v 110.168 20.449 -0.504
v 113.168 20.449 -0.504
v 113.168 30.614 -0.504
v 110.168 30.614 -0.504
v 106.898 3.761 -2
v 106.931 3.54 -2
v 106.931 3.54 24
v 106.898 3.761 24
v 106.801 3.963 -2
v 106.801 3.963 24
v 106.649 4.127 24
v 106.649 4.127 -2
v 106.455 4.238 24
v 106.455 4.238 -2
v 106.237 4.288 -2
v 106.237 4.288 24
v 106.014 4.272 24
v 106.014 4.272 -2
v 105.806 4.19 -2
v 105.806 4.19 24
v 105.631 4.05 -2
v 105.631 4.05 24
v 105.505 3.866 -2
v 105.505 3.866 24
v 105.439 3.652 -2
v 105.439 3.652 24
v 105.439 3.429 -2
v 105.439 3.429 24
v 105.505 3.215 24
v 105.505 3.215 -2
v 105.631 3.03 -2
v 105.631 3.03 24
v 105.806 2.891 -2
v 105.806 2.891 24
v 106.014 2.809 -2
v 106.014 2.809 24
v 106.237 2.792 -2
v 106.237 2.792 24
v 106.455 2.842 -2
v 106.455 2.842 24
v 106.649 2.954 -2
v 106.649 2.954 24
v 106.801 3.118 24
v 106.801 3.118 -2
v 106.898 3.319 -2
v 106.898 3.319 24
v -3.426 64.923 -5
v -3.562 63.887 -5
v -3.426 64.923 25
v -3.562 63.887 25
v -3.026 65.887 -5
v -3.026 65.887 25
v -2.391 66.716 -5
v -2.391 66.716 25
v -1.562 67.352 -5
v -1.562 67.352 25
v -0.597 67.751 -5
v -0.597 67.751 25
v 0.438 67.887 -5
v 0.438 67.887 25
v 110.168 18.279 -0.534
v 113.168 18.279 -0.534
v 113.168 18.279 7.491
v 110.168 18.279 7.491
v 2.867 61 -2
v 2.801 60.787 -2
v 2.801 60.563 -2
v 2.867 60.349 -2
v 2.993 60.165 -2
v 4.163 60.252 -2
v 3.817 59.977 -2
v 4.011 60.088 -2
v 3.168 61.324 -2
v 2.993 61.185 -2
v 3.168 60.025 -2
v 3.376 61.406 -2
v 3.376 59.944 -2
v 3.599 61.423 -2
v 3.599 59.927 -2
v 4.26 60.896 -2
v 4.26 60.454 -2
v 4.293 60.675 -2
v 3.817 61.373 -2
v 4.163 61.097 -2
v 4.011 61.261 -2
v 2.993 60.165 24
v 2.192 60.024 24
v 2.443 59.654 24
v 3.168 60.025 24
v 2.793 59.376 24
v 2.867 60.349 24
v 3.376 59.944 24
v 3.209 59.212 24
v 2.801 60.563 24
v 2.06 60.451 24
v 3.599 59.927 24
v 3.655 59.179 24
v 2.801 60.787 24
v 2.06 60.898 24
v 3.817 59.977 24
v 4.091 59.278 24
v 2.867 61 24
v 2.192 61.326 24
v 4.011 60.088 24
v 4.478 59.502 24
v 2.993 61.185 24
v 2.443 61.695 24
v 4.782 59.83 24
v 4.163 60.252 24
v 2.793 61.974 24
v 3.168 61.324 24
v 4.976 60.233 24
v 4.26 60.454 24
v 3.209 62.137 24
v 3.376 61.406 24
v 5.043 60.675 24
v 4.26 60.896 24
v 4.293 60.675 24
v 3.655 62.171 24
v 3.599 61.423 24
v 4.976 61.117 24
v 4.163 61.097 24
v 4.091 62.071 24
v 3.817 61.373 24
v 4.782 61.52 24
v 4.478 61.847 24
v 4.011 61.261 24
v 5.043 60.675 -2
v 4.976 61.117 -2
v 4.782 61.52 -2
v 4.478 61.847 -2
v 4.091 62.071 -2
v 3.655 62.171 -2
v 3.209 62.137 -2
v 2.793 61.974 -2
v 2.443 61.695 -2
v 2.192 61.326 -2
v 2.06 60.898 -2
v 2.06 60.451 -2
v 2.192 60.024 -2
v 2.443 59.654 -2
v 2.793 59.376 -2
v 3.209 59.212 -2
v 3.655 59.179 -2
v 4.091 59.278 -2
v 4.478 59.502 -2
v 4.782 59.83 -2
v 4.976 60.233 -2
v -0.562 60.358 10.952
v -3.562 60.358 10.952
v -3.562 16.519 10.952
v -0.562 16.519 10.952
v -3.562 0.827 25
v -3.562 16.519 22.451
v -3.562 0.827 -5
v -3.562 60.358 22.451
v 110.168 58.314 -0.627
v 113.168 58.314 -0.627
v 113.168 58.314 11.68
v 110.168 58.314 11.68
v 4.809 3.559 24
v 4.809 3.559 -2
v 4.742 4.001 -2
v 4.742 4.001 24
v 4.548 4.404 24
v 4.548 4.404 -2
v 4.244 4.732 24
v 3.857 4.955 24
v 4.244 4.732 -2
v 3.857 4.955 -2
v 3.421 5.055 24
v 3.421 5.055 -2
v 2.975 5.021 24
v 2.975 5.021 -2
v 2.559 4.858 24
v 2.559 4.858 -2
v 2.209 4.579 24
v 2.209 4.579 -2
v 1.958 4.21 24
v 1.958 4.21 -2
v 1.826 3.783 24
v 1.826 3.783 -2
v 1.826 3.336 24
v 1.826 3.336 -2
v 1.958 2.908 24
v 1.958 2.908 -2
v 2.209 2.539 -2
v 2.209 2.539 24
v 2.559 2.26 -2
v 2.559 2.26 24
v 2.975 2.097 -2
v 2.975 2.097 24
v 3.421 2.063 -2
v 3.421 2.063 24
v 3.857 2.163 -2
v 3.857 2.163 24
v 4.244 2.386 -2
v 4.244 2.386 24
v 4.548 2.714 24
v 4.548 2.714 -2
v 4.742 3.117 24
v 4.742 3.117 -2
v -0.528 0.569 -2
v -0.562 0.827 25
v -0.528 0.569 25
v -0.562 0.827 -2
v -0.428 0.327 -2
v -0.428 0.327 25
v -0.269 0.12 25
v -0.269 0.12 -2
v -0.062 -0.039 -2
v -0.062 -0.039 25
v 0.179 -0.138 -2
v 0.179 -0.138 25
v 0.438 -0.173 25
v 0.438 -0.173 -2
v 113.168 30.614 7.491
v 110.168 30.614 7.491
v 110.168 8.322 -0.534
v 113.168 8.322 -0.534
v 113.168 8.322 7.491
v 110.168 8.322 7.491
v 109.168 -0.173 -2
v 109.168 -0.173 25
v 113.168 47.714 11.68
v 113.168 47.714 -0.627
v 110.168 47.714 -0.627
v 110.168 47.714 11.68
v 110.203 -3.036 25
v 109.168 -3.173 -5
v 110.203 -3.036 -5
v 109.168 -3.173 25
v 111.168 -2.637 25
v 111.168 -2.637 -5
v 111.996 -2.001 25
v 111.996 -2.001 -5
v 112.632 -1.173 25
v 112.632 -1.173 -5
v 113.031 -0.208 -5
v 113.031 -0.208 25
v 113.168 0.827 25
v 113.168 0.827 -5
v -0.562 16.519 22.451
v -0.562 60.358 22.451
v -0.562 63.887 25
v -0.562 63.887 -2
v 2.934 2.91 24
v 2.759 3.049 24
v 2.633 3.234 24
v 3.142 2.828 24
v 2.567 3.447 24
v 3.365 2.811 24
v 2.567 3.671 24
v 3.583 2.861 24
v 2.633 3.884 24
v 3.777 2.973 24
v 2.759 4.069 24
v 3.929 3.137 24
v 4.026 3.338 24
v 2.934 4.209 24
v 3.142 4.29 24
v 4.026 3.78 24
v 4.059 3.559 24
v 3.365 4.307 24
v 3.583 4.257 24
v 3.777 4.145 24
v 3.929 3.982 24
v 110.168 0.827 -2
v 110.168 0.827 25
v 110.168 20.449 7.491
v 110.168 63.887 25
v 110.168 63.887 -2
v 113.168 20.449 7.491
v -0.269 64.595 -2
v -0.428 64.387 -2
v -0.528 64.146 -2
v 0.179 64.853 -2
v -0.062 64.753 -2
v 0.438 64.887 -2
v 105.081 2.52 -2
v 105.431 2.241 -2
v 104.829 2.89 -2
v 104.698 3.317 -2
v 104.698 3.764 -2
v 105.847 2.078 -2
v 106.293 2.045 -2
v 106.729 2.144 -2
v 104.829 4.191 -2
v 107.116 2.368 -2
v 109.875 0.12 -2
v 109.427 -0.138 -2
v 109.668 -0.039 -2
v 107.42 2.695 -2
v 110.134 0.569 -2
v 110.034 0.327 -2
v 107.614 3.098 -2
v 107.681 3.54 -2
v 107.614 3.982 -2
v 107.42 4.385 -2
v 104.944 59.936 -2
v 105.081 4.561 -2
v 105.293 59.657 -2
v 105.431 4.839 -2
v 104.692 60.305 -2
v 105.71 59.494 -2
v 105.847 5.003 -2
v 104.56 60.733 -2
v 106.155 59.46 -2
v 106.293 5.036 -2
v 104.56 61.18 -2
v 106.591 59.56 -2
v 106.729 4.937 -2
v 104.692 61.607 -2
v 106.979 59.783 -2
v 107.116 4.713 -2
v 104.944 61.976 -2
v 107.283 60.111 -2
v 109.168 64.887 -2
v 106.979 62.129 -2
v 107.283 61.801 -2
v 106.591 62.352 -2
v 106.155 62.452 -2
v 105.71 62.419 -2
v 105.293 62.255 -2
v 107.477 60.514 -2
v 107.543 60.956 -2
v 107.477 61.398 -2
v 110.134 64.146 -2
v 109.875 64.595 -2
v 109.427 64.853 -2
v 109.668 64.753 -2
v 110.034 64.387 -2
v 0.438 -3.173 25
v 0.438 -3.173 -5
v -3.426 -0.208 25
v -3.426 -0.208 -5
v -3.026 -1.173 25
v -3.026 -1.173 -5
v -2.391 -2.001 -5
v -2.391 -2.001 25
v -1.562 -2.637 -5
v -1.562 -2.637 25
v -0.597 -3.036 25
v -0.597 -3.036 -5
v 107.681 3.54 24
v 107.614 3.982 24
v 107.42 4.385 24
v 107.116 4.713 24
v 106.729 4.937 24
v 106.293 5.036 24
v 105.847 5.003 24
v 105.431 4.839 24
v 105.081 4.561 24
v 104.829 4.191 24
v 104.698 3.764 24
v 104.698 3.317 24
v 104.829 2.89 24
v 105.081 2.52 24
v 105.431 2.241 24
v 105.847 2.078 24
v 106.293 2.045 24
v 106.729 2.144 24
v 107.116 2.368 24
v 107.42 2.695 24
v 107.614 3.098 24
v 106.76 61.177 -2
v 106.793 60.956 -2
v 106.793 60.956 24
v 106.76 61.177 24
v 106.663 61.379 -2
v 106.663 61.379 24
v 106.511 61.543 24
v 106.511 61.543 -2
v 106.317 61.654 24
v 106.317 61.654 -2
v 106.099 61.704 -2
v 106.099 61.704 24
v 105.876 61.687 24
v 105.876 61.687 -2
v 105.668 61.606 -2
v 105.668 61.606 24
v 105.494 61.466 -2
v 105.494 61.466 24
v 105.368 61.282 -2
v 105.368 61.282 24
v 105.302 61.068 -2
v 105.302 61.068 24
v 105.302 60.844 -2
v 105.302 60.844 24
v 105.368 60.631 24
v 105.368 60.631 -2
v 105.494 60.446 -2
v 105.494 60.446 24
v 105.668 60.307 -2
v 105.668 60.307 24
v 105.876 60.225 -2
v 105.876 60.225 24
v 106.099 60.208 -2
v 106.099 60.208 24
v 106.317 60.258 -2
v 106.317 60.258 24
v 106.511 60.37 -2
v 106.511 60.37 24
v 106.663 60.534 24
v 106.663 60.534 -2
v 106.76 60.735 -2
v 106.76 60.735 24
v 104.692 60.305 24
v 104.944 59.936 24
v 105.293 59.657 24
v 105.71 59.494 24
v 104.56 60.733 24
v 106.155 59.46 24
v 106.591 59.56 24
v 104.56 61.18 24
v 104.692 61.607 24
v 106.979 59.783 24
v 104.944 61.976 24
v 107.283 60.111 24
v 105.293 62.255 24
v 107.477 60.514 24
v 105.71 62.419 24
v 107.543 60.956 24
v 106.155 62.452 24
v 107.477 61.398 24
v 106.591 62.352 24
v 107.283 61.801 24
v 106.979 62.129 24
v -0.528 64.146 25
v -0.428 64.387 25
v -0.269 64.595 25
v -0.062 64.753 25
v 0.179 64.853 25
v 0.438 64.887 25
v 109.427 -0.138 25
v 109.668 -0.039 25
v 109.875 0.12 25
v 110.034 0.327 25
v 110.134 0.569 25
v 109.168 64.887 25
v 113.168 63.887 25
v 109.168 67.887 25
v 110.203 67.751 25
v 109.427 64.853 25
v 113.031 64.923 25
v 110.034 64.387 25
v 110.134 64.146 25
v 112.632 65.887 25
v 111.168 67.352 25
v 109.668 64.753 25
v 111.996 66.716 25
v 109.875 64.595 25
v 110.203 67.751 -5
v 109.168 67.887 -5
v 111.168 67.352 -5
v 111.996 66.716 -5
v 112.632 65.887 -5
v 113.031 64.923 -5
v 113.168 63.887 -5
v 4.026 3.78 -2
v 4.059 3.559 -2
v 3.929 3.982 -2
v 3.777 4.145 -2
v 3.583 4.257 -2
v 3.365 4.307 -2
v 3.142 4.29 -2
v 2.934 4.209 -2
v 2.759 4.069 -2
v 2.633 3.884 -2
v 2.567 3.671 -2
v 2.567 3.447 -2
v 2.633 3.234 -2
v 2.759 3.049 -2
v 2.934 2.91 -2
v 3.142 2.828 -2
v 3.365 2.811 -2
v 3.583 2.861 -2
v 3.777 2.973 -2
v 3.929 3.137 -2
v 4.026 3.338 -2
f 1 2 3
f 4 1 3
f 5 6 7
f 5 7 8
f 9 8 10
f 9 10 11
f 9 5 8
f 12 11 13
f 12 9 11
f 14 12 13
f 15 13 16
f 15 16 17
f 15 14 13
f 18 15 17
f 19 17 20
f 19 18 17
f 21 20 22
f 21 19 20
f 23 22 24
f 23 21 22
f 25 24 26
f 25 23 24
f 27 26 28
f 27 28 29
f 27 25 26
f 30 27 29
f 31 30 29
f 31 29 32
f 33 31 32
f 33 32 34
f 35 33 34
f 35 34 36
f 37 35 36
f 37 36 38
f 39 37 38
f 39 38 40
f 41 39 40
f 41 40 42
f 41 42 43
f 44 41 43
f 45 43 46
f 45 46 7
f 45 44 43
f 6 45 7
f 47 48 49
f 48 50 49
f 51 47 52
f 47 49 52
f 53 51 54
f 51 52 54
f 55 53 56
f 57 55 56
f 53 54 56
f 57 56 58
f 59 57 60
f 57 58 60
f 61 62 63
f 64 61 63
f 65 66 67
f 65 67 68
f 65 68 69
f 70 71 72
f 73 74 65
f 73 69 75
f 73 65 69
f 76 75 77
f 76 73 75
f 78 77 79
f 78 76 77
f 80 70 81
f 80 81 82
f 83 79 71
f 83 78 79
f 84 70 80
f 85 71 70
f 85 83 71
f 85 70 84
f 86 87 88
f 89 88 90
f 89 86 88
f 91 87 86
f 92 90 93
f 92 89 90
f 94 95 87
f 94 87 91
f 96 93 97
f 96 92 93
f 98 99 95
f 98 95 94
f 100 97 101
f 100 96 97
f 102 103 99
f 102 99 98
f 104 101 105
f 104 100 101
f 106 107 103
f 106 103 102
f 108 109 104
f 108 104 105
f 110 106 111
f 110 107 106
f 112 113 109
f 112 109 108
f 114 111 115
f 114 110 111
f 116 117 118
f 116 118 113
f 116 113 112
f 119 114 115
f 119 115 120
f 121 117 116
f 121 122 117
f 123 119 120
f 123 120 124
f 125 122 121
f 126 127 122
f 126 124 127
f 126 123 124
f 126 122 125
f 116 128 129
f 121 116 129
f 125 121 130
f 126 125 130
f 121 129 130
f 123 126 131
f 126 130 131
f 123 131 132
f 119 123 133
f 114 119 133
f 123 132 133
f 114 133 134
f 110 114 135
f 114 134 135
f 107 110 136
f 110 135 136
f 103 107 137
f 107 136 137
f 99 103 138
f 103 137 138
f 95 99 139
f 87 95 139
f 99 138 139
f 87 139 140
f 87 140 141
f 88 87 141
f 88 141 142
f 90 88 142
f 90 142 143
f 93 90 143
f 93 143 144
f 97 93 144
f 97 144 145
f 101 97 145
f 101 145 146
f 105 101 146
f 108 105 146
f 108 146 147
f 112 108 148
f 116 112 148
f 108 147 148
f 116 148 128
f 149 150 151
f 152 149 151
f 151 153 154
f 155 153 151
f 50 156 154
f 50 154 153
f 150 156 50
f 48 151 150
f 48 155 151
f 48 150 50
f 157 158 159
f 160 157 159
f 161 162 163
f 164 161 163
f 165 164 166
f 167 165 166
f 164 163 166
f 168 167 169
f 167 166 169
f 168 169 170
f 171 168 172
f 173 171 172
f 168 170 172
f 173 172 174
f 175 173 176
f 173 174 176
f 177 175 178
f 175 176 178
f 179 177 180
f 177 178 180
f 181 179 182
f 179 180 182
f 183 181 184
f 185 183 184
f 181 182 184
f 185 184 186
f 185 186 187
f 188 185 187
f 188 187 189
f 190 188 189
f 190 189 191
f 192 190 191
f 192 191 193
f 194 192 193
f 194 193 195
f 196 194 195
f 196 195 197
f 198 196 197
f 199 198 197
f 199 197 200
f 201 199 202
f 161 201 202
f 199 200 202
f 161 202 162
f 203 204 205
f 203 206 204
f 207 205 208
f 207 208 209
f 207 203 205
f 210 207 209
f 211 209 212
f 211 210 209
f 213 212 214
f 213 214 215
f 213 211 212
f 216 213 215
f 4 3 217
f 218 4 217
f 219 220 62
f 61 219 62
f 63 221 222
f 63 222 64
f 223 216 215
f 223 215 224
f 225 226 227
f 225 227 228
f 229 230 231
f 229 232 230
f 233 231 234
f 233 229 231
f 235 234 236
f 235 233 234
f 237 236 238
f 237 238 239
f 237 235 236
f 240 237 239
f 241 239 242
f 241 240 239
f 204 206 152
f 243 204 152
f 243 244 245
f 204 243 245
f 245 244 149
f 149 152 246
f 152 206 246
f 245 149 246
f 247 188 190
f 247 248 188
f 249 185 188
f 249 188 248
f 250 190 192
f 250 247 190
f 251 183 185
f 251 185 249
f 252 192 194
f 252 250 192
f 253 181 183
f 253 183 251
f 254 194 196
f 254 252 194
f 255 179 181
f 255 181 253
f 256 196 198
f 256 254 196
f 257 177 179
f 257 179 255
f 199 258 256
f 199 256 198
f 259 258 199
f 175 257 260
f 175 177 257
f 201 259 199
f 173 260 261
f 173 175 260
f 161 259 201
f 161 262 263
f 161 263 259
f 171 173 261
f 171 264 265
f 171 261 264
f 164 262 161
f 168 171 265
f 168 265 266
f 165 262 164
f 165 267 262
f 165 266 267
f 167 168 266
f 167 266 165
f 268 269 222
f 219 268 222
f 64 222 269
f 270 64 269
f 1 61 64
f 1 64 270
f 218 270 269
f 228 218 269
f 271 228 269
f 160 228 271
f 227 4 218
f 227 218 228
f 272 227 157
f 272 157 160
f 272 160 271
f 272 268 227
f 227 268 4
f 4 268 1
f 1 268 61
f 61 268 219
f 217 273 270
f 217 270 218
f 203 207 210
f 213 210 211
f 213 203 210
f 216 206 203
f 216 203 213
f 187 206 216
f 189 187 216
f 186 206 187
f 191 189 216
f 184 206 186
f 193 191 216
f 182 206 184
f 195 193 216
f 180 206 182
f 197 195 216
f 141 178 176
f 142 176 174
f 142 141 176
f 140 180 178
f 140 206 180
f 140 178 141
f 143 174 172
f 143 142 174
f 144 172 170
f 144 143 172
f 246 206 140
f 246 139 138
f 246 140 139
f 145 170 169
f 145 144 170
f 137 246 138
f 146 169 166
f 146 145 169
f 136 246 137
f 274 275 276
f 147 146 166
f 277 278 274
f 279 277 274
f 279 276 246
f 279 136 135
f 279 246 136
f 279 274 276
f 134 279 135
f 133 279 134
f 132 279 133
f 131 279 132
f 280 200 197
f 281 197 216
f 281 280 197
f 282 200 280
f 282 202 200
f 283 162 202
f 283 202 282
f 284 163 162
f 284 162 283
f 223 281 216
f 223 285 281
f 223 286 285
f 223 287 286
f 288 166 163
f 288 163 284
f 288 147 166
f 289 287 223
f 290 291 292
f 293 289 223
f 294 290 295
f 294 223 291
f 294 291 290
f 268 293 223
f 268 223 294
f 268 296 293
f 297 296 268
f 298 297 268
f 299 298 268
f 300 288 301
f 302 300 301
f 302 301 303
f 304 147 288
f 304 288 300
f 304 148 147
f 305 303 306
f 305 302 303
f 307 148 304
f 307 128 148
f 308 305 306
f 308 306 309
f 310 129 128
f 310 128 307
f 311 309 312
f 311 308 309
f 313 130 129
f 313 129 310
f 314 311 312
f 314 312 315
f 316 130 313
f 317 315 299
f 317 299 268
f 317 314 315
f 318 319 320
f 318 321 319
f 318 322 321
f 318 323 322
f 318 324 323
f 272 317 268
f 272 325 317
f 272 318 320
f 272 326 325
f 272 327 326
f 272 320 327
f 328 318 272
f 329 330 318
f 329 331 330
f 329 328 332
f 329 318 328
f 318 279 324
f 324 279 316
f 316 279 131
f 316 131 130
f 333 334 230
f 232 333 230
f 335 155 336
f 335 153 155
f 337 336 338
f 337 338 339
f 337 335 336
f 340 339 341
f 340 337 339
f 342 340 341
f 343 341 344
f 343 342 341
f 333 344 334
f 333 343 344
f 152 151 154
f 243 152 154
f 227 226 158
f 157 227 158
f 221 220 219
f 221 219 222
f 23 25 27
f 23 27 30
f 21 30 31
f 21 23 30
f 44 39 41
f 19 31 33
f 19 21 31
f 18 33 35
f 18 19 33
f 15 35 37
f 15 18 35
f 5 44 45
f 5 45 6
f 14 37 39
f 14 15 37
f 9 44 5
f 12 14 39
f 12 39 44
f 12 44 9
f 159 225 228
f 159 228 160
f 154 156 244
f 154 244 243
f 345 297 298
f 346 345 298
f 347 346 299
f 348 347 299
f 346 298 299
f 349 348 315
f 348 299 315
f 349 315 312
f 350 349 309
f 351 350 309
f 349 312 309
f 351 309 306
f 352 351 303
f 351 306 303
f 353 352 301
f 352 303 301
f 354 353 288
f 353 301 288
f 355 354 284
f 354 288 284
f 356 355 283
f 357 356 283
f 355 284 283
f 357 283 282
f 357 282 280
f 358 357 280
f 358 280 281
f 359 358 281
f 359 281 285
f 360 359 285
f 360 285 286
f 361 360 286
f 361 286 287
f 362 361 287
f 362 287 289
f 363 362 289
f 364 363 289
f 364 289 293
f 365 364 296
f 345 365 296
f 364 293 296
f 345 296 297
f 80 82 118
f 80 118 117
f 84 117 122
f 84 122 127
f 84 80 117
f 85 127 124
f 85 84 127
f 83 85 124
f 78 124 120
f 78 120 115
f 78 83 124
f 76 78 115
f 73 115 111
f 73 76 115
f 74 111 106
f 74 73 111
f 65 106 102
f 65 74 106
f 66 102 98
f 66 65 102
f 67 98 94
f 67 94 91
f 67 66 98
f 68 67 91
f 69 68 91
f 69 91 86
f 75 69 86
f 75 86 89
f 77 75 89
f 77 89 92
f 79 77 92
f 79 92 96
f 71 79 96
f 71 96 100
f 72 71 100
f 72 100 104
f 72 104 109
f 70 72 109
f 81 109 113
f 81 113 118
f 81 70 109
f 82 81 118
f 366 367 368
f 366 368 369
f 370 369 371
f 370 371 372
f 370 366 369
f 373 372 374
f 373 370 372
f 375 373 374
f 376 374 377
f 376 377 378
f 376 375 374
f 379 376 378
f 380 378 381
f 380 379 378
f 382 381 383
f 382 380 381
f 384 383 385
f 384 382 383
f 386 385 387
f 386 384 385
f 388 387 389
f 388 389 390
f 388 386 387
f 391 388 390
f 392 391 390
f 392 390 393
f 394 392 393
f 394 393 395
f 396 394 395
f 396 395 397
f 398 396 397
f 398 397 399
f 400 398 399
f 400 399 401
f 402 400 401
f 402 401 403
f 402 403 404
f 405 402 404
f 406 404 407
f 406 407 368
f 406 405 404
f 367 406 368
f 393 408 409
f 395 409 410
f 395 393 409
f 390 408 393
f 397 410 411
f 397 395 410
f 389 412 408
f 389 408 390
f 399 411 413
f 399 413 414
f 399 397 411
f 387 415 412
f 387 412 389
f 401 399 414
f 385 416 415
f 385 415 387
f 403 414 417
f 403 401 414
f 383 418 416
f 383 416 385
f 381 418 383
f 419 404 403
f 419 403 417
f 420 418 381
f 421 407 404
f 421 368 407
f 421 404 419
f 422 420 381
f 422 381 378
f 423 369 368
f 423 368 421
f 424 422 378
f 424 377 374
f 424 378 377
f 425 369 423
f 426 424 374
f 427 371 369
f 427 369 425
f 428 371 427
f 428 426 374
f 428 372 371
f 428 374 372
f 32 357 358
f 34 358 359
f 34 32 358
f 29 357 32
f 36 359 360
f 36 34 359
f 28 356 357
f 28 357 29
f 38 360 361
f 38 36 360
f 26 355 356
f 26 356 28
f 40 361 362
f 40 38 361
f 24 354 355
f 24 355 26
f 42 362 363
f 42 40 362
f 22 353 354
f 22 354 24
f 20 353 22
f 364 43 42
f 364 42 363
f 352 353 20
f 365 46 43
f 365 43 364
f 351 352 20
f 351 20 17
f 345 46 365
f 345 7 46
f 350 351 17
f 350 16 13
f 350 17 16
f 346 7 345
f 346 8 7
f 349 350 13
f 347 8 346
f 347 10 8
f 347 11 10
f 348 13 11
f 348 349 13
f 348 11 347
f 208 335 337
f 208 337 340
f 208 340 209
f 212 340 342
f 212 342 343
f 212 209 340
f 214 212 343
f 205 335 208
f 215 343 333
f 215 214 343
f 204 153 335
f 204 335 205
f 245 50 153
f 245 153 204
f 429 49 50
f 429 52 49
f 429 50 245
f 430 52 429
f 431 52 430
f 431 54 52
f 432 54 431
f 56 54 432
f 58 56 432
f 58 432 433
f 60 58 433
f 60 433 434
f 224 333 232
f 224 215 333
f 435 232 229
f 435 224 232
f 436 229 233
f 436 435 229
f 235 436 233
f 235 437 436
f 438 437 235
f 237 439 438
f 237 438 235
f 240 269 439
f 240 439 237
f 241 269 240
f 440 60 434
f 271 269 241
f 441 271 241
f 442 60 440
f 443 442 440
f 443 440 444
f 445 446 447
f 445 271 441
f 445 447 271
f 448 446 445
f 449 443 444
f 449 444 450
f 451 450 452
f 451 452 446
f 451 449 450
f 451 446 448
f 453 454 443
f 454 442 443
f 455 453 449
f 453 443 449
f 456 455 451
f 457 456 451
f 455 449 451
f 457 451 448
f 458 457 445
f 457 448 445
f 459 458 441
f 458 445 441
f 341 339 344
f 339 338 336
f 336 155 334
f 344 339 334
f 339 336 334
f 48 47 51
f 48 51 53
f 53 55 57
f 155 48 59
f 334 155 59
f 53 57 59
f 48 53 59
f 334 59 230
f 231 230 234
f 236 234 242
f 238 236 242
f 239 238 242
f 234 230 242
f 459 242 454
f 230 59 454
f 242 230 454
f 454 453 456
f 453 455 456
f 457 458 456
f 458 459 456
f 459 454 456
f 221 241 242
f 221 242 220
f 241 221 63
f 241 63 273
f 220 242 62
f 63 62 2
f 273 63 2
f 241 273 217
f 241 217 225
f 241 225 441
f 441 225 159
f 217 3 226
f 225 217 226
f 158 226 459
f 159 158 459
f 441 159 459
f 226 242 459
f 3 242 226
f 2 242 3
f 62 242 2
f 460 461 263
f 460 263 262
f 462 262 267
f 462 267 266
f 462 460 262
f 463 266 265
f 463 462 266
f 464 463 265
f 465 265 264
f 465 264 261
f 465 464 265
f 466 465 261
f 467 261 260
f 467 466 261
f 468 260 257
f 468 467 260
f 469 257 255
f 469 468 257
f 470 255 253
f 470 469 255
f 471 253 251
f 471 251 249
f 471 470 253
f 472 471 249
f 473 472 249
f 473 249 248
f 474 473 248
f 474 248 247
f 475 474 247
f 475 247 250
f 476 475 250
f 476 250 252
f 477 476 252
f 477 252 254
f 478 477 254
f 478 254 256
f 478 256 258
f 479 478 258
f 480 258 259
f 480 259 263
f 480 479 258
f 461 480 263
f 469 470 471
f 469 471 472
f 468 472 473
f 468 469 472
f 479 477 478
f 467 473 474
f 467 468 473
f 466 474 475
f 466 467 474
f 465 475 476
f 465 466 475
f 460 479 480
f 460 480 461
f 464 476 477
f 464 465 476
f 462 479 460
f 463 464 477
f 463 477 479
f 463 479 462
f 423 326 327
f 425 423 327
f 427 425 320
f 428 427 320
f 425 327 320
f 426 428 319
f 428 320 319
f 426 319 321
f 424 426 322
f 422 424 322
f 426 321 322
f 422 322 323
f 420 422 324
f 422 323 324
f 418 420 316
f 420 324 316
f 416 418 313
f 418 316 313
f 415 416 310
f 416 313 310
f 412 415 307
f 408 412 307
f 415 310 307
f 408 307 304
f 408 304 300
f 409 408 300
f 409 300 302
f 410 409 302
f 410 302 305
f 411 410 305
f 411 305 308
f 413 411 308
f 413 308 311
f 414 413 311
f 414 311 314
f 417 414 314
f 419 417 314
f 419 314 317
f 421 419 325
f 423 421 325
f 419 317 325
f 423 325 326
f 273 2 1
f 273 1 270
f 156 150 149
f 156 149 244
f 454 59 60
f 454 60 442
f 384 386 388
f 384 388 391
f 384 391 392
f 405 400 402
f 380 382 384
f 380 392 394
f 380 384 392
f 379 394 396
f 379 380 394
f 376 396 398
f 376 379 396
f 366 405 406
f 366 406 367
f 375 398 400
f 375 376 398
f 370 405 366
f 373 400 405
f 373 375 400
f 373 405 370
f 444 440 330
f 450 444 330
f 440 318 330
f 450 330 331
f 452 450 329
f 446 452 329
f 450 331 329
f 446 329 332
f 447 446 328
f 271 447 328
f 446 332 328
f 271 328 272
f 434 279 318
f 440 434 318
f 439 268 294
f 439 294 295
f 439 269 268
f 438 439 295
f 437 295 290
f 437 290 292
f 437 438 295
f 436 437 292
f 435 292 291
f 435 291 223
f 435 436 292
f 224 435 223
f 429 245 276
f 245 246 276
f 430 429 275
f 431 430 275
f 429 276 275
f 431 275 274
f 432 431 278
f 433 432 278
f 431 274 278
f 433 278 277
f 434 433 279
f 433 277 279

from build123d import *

# Parameters (mm, degrees)
SKETCH_W        = 116.73
SKETCH_H        = 71.06
PAD_DEPTH       = 30
THICKNESS_T     = -3
SKETCH001_W     = 10.600402
SKETCH001_H     = 12.306634
SKETCH001_W_2   = 9.956932
SKETCH001_H_2   = 8.02499
SKETCH001_W_3   = 10.164987
SKETCH001_H_3   = 7.995267
POCKET_DEPTH    = 5
SKETCH005_R     = 1.5
SKETCH005_R_2   = 0.75
PAD004_DEPTH    = 26
PAD005_DEPTH    = 26
PAD006_DEPTH    = 26
PAD007_DEPTH    = 26
SKETCH004_W     = 43.838747
SKETCH004_H     = 11.498687
POCKET001_DEPTH = 5
FILLET_R        = 4
FILLET002_R     = 4
FILLET003_R     = 4
FILLET004_R     = 1
FILLET005_R     = 1
FILLET006_R     = 1


with BuildPart() as part:
    # Sketch → Pad (new body)
    with BuildSketch(Plane.XY):
        with Locations((54.802781, 32.357444)):
            Rectangle(SKETCH_W, SKETCH_H)
    extrude(amount=PAD_DEPTH)

    # Thickness
    thickness_openings = [part.faces().sort_by_distance(p)[0] for p in [
        (54.802781, 32.357444, 30),
    ]]
    offset(amount=THICKNESS_T, openings=thickness_openings, kind=Kind.INTERSECTION)

    # Sketch001 (on Face3 of Thickness) → Pocket (cut)
    with BuildSketch(Plane.YZ.offset(113.167781)):
        with Locations((53.013897, 10.526186)):
            Rectangle(SKETCH001_W, SKETCH001_H)
        with Locations((13.300911, 8.478813)):
            Rectangle(SKETCH001_W_2, SKETCH001_H_2)
        with Locations((25.531591, 8.493675)):
            Rectangle(SKETCH001_W_3, SKETCH001_H_3)
    extrude(amount=-POCKET_DEPTH, mode=Mode.SUBTRACT)

    # Sketch005 (on Face23 of Pocket) → Pad004 (join)
    with BuildSketch(Plane.XY.offset(3)):
        with Locations((3.543065, 60.674728)):
            Circle(SKETCH005_R)
        with Locations((3.543065, 60.674728)):
            Circle(SKETCH005_R_2, mode=Mode.SUBTRACT)
        with Locations((106.043365, 60.956181)):
            Circle(SKETCH005_R)
        with Locations((106.043365, 60.956181)):
            Circle(SKETCH005_R_2, mode=Mode.SUBTRACT)
        with Locations((3.308966, 3.559068)):
            Circle(SKETCH005_R)
        with Locations((3.308966, 3.559068)):
            Circle(SKETCH005_R_2, mode=Mode.SUBTRACT)
        with Locations((106.180908, 3.540333)):
            Circle(SKETCH005_R)
        with Locations((106.180908, 3.540333)):
            Circle(SKETCH005_R_2, mode=Mode.SUBTRACT)
    extrude(amount=PAD004_DEPTH)

    # Sketch005 (on Face23 of Pocket) → Pad005 (join)
    with BuildSketch(Plane.XY.offset(3)):
        with Locations((3.543065, 60.674728)):
            Circle(SKETCH005_R)
        with Locations((3.543065, 60.674728)):
            Circle(SKETCH005_R_2, mode=Mode.SUBTRACT)
        with Locations((106.043365, 60.956181)):
            Circle(SKETCH005_R)
        with Locations((106.043365, 60.956181)):
            Circle(SKETCH005_R_2, mode=Mode.SUBTRACT)
        with Locations((3.308966, 3.559068)):
            Circle(SKETCH005_R)
        with Locations((3.308966, 3.559068)):
            Circle(SKETCH005_R_2, mode=Mode.SUBTRACT)
        with Locations((106.180908, 3.540333)):
            Circle(SKETCH005_R)
        with Locations((106.180908, 3.540333)):
            Circle(SKETCH005_R_2, mode=Mode.SUBTRACT)
    extrude(amount=PAD005_DEPTH)

    # Sketch005 (on Face23 of Pocket) → Pad006 (join)
    with BuildSketch(Plane.XY.offset(3)):
        with Locations((3.543065, 60.674728)):
            Circle(SKETCH005_R)
        with Locations((3.543065, 60.674728)):
            Circle(SKETCH005_R_2, mode=Mode.SUBTRACT)
        with Locations((106.043365, 60.956181)):
            Circle(SKETCH005_R)
        with Locations((106.043365, 60.956181)):
            Circle(SKETCH005_R_2, mode=Mode.SUBTRACT)
        with Locations((3.308966, 3.559068)):
            Circle(SKETCH005_R)
        with Locations((3.308966, 3.559068)):
            Circle(SKETCH005_R_2, mode=Mode.SUBTRACT)
        with Locations((106.180908, 3.540333)):
            Circle(SKETCH005_R)
        with Locations((106.180908, 3.540333)):
            Circle(SKETCH005_R_2, mode=Mode.SUBTRACT)
    extrude(amount=PAD006_DEPTH)

    # Sketch005 (on Face23 of Pocket) → Pad007 (join)
    with BuildSketch(Plane.XY.offset(3)):
        with Locations((3.543065, 60.674728)):
            Circle(SKETCH005_R)
        with Locations((3.543065, 60.674728)):
            Circle(SKETCH005_R_2, mode=Mode.SUBTRACT)
        with Locations((106.043365, 60.956181)):
            Circle(SKETCH005_R)
        with Locations((106.043365, 60.956181)):
            Circle(SKETCH005_R_2, mode=Mode.SUBTRACT)
        with Locations((3.308966, 3.559068)):
            Circle(SKETCH005_R)
        with Locations((3.308966, 3.559068)):
            Circle(SKETCH005_R_2, mode=Mode.SUBTRACT)
        with Locations((106.180908, 3.540333)):
            Circle(SKETCH005_R)
        with Locations((106.180908, 3.540333)):
            Circle(SKETCH005_R_2, mode=Mode.SUBTRACT)
    extrude(amount=PAD007_DEPTH)

    # Sketch004 → Pocket001 (cut)
    with BuildSketch(Plane(origin=(-3.562219, 0, 0), x_dir=(0, -1, 0), z_dir=(-1, 0, 0))):
        with Locations((-38.438376, 21.701757)):
            Rectangle(SKETCH004_W, SKETCH004_H)
    extrude(amount=-POCKET001_DEPTH, mode=Mode.SUBTRACT)

    # Fillet
    fillet_edges = [part.edges().sort_by_distance(p)[0] for p in [
        (-3.562219, -3.172556, 15),
    ]]
    fillet(fillet_edges, radius=FILLET_R)

    # Fillet002
    fillet002_edges = [part.edges().sort_by_distance(p)[0] for p in [
        (-3.562219, 67.887444, 15),
        (113.167781, 67.887444, 15),
    ]]
    fillet(fillet002_edges, radius=FILLET002_R)

    # Fillet003
    fillet003_edges = [part.edges().sort_by_distance(p)[0] for p in [
        (113.167781, -3.172556, 15),
    ]]
    fillet(fillet003_edges, radius=FILLET003_R)

    # Fillet004
    fillet004_edges = [part.edges().sort_by_distance(p)[0] for p in [
        (-0.562219, 64.887444, 16.5),
    ]]
    fillet(fillet004_edges, radius=FILLET004_R)

    # Fillet005
    fillet005_edges = [part.edges().sort_by_distance(p)[0] for p in [
        (110.167781, 64.887444, 16.5),
    ]]
    fillet(fillet005_edges, radius=FILLET005_R)

    # Fillet006
    fillet006_edges = [part.edges().sort_by_distance(p)[0] for p in [
        (110.167781, -0.172556, 16.5),
        (-0.562219, -0.172556, 16.5),
    ]]
    fillet(fillet006_edges, radius=FILLET006_R)


with BuildPart() as part_1:
    # Body placement: moved
    add(part.part.moved(Location((0, 0, -5))))


solid = part_1.part
